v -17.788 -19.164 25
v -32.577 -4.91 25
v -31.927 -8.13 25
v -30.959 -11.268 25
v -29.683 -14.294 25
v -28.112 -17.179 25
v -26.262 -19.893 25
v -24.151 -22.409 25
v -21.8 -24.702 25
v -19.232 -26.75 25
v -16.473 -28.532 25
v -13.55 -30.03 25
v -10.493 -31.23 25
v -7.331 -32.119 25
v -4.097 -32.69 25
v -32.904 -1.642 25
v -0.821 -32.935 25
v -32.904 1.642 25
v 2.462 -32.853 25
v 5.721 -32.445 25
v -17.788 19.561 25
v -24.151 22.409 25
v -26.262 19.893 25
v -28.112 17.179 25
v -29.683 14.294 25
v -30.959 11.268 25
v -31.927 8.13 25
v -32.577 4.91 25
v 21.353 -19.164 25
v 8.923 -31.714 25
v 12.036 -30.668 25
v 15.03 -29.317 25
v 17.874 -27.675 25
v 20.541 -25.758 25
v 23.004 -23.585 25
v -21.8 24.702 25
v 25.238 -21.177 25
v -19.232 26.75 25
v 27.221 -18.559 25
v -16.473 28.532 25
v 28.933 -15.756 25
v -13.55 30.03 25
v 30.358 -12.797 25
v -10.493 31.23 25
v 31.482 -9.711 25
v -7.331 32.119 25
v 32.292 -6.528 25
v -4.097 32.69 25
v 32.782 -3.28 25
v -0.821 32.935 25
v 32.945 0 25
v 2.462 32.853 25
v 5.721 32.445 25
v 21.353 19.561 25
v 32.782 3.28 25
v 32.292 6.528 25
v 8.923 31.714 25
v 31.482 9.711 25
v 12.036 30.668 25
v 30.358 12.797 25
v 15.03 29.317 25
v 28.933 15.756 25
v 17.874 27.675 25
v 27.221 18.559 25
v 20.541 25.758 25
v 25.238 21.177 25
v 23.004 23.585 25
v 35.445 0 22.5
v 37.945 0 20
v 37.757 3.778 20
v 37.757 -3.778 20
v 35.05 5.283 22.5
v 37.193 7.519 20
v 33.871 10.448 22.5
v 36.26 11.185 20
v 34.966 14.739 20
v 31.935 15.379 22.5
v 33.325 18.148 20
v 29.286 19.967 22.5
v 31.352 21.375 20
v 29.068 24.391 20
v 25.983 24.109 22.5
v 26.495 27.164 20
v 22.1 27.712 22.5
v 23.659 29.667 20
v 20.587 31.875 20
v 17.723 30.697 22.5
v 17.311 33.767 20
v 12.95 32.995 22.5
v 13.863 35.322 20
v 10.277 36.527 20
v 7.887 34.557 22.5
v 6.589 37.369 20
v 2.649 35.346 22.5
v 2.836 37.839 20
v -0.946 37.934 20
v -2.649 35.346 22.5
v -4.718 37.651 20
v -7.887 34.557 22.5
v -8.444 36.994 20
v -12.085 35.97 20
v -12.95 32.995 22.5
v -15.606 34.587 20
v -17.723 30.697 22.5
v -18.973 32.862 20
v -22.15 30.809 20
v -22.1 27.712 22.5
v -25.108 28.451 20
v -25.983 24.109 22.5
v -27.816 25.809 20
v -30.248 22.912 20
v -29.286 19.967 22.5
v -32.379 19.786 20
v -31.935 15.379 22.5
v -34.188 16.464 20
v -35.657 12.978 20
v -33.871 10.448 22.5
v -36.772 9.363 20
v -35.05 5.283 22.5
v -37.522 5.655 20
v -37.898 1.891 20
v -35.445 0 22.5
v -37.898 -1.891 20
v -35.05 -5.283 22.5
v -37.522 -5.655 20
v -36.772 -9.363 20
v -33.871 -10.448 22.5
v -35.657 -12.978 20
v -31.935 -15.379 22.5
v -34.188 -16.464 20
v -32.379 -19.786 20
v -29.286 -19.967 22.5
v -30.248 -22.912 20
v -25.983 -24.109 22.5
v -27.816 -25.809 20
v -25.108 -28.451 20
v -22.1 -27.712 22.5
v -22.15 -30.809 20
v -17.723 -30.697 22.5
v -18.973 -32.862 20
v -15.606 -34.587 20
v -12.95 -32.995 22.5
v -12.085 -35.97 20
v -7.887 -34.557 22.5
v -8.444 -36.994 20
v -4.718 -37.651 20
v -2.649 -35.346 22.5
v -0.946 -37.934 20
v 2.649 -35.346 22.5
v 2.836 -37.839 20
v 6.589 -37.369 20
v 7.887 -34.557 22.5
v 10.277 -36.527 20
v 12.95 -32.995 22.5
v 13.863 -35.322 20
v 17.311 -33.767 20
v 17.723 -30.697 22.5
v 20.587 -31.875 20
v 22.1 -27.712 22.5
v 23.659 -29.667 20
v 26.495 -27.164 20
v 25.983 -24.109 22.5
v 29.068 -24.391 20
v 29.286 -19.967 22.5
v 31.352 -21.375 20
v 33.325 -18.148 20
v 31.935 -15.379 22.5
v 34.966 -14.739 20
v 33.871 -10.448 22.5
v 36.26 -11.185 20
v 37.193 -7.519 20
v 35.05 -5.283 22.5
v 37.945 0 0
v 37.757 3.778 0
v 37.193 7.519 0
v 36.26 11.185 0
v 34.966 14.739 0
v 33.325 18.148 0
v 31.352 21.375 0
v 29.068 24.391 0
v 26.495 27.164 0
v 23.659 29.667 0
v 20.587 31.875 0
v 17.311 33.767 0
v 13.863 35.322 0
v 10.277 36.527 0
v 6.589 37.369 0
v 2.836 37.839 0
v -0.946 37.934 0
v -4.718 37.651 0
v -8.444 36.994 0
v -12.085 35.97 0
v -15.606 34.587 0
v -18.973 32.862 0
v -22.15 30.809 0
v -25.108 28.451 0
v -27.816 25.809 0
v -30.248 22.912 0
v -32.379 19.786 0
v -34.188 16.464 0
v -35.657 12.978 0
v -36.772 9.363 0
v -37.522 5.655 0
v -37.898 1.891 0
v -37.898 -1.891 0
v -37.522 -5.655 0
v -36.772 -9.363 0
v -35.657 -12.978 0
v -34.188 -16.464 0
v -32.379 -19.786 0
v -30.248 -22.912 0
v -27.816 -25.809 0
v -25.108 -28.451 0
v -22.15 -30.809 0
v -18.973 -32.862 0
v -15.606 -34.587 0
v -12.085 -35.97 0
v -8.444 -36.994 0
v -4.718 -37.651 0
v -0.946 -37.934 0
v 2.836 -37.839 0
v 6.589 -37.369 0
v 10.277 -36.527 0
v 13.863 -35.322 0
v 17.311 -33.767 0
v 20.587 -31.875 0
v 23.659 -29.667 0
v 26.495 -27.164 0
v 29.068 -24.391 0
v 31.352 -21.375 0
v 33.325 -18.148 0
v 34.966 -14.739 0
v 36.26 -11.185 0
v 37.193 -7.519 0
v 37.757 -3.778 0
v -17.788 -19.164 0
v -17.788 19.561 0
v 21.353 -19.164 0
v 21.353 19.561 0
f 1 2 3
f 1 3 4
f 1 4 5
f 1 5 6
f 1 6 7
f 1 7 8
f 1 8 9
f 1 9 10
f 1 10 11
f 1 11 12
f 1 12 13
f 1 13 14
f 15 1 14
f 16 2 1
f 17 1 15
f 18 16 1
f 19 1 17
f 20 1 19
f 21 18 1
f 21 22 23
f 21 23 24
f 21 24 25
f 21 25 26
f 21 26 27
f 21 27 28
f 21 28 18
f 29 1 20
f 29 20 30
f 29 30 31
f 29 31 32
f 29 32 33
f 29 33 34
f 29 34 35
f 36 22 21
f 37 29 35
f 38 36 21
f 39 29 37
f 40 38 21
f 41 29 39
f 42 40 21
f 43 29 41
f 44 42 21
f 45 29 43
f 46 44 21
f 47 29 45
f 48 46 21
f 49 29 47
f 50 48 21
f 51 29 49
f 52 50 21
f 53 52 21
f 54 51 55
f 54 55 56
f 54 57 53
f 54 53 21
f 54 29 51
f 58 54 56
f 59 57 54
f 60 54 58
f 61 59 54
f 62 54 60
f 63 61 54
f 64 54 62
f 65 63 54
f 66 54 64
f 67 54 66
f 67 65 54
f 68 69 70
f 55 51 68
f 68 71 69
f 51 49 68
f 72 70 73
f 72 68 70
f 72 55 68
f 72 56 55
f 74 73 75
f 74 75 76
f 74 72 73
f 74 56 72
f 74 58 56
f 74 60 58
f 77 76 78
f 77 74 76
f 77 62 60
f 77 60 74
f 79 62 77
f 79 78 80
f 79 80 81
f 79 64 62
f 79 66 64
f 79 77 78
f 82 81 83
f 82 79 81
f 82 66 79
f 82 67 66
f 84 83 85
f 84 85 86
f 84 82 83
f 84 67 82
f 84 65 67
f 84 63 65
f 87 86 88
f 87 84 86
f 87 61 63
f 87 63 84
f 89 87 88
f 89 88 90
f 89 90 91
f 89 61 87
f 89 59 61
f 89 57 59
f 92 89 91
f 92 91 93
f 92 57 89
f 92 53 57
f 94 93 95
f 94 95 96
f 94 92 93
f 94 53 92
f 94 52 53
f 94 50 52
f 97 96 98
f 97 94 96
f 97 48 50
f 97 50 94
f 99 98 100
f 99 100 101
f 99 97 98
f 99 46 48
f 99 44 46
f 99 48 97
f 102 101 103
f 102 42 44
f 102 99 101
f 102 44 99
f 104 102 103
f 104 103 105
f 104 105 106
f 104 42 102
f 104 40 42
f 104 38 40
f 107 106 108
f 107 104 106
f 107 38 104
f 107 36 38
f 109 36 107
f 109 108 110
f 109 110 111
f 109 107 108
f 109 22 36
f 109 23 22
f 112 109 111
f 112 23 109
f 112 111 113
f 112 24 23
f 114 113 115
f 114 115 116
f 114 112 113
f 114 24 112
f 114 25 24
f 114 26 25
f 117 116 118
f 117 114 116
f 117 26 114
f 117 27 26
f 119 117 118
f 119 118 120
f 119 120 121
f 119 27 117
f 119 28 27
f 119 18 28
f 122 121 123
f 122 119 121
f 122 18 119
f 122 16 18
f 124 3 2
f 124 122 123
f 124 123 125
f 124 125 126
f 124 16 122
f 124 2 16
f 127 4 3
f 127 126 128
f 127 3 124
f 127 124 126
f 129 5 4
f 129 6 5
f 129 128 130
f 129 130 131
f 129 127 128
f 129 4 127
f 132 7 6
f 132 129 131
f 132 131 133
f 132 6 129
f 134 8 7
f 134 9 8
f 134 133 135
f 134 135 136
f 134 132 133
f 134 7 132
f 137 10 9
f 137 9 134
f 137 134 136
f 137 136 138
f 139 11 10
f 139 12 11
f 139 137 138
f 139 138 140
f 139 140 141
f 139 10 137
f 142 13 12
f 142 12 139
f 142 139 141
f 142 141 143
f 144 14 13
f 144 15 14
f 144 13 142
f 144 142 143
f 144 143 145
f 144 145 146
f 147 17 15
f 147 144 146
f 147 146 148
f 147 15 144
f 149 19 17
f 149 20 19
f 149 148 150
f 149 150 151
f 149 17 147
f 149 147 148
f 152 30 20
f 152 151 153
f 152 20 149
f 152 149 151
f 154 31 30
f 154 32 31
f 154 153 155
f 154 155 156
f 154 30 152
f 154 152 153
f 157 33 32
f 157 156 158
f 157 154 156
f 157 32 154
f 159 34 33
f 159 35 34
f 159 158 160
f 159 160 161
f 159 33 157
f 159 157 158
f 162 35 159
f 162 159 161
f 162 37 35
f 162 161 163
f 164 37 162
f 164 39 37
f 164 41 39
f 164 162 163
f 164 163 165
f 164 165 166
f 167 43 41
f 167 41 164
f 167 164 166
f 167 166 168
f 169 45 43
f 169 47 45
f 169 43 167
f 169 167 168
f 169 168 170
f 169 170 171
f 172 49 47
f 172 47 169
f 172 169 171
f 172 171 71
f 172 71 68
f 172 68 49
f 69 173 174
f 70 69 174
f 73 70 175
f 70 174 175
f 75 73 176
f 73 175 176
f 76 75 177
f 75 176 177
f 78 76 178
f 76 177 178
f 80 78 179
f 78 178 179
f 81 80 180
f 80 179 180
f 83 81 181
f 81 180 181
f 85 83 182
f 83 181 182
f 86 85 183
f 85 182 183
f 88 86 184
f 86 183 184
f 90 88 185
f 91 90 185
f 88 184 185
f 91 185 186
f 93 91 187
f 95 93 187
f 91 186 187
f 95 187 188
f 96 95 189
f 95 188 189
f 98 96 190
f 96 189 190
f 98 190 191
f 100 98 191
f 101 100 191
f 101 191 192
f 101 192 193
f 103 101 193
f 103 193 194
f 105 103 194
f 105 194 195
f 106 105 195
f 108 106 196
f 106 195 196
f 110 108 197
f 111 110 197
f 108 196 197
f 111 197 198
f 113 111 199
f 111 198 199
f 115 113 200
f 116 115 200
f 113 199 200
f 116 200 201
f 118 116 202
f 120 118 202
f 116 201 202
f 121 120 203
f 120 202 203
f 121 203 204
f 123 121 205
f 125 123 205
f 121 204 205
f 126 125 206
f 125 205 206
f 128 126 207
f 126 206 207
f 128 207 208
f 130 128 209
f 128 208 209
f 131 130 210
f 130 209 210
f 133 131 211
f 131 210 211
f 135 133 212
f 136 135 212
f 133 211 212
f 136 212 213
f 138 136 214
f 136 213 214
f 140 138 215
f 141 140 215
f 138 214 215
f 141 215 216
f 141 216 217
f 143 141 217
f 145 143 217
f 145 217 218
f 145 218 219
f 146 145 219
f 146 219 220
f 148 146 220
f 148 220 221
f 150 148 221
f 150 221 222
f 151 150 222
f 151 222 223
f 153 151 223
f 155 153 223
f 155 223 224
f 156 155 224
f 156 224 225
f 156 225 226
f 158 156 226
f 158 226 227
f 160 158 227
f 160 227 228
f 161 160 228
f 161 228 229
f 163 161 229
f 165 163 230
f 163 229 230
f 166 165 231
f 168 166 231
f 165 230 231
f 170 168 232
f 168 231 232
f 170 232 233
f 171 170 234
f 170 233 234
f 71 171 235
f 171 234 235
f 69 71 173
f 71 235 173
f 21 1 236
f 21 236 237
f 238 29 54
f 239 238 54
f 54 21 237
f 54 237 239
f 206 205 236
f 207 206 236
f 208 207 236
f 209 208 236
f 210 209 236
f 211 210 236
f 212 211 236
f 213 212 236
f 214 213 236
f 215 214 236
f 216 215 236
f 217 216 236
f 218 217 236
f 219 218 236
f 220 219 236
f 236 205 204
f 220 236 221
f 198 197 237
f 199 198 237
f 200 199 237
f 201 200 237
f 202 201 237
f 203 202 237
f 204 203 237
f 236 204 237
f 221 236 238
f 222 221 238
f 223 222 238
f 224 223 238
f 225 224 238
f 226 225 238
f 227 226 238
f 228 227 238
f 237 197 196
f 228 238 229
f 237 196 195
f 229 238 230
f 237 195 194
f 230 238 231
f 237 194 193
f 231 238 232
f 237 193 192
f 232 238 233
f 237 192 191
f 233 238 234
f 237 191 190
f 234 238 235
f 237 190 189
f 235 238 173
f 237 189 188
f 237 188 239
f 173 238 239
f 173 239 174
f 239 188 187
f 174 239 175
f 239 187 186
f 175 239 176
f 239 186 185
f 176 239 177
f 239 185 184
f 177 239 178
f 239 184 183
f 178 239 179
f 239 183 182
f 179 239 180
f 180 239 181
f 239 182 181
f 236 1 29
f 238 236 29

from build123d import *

# Parameters (mm, degrees)
F0_R     = 37.945444
F1_DEPTH = 25
F2_W     = 39.141135
F2_H     = 38.724022
F3_DEPTH = 25
F4_SIZE  = 5


with BuildPart() as f1:
    # F0 (on Top) → F1 (new body)
    with BuildSketch(Plane.XY):
        Circle(F0_R)
    extrude(amount=F1_DEPTH)

    # F2 (on face) → F3 (cut)
    with BuildSketch(Plane.XY.offset(25)):
        with Locations((1.78278, 0.198509)):
            Rectangle(F2_W, F2_H)
    extrude(amount=-F3_DEPTH, mode=Mode.SUBTRACT)

    # F4
    f4_edges = [f1.edges().sort_by_distance(p)[0] for p in [
        (-37.945444, 0, 25),
    ]]
    chamfer(f4_edges, length=F4_SIZE)


solid = f1.part
